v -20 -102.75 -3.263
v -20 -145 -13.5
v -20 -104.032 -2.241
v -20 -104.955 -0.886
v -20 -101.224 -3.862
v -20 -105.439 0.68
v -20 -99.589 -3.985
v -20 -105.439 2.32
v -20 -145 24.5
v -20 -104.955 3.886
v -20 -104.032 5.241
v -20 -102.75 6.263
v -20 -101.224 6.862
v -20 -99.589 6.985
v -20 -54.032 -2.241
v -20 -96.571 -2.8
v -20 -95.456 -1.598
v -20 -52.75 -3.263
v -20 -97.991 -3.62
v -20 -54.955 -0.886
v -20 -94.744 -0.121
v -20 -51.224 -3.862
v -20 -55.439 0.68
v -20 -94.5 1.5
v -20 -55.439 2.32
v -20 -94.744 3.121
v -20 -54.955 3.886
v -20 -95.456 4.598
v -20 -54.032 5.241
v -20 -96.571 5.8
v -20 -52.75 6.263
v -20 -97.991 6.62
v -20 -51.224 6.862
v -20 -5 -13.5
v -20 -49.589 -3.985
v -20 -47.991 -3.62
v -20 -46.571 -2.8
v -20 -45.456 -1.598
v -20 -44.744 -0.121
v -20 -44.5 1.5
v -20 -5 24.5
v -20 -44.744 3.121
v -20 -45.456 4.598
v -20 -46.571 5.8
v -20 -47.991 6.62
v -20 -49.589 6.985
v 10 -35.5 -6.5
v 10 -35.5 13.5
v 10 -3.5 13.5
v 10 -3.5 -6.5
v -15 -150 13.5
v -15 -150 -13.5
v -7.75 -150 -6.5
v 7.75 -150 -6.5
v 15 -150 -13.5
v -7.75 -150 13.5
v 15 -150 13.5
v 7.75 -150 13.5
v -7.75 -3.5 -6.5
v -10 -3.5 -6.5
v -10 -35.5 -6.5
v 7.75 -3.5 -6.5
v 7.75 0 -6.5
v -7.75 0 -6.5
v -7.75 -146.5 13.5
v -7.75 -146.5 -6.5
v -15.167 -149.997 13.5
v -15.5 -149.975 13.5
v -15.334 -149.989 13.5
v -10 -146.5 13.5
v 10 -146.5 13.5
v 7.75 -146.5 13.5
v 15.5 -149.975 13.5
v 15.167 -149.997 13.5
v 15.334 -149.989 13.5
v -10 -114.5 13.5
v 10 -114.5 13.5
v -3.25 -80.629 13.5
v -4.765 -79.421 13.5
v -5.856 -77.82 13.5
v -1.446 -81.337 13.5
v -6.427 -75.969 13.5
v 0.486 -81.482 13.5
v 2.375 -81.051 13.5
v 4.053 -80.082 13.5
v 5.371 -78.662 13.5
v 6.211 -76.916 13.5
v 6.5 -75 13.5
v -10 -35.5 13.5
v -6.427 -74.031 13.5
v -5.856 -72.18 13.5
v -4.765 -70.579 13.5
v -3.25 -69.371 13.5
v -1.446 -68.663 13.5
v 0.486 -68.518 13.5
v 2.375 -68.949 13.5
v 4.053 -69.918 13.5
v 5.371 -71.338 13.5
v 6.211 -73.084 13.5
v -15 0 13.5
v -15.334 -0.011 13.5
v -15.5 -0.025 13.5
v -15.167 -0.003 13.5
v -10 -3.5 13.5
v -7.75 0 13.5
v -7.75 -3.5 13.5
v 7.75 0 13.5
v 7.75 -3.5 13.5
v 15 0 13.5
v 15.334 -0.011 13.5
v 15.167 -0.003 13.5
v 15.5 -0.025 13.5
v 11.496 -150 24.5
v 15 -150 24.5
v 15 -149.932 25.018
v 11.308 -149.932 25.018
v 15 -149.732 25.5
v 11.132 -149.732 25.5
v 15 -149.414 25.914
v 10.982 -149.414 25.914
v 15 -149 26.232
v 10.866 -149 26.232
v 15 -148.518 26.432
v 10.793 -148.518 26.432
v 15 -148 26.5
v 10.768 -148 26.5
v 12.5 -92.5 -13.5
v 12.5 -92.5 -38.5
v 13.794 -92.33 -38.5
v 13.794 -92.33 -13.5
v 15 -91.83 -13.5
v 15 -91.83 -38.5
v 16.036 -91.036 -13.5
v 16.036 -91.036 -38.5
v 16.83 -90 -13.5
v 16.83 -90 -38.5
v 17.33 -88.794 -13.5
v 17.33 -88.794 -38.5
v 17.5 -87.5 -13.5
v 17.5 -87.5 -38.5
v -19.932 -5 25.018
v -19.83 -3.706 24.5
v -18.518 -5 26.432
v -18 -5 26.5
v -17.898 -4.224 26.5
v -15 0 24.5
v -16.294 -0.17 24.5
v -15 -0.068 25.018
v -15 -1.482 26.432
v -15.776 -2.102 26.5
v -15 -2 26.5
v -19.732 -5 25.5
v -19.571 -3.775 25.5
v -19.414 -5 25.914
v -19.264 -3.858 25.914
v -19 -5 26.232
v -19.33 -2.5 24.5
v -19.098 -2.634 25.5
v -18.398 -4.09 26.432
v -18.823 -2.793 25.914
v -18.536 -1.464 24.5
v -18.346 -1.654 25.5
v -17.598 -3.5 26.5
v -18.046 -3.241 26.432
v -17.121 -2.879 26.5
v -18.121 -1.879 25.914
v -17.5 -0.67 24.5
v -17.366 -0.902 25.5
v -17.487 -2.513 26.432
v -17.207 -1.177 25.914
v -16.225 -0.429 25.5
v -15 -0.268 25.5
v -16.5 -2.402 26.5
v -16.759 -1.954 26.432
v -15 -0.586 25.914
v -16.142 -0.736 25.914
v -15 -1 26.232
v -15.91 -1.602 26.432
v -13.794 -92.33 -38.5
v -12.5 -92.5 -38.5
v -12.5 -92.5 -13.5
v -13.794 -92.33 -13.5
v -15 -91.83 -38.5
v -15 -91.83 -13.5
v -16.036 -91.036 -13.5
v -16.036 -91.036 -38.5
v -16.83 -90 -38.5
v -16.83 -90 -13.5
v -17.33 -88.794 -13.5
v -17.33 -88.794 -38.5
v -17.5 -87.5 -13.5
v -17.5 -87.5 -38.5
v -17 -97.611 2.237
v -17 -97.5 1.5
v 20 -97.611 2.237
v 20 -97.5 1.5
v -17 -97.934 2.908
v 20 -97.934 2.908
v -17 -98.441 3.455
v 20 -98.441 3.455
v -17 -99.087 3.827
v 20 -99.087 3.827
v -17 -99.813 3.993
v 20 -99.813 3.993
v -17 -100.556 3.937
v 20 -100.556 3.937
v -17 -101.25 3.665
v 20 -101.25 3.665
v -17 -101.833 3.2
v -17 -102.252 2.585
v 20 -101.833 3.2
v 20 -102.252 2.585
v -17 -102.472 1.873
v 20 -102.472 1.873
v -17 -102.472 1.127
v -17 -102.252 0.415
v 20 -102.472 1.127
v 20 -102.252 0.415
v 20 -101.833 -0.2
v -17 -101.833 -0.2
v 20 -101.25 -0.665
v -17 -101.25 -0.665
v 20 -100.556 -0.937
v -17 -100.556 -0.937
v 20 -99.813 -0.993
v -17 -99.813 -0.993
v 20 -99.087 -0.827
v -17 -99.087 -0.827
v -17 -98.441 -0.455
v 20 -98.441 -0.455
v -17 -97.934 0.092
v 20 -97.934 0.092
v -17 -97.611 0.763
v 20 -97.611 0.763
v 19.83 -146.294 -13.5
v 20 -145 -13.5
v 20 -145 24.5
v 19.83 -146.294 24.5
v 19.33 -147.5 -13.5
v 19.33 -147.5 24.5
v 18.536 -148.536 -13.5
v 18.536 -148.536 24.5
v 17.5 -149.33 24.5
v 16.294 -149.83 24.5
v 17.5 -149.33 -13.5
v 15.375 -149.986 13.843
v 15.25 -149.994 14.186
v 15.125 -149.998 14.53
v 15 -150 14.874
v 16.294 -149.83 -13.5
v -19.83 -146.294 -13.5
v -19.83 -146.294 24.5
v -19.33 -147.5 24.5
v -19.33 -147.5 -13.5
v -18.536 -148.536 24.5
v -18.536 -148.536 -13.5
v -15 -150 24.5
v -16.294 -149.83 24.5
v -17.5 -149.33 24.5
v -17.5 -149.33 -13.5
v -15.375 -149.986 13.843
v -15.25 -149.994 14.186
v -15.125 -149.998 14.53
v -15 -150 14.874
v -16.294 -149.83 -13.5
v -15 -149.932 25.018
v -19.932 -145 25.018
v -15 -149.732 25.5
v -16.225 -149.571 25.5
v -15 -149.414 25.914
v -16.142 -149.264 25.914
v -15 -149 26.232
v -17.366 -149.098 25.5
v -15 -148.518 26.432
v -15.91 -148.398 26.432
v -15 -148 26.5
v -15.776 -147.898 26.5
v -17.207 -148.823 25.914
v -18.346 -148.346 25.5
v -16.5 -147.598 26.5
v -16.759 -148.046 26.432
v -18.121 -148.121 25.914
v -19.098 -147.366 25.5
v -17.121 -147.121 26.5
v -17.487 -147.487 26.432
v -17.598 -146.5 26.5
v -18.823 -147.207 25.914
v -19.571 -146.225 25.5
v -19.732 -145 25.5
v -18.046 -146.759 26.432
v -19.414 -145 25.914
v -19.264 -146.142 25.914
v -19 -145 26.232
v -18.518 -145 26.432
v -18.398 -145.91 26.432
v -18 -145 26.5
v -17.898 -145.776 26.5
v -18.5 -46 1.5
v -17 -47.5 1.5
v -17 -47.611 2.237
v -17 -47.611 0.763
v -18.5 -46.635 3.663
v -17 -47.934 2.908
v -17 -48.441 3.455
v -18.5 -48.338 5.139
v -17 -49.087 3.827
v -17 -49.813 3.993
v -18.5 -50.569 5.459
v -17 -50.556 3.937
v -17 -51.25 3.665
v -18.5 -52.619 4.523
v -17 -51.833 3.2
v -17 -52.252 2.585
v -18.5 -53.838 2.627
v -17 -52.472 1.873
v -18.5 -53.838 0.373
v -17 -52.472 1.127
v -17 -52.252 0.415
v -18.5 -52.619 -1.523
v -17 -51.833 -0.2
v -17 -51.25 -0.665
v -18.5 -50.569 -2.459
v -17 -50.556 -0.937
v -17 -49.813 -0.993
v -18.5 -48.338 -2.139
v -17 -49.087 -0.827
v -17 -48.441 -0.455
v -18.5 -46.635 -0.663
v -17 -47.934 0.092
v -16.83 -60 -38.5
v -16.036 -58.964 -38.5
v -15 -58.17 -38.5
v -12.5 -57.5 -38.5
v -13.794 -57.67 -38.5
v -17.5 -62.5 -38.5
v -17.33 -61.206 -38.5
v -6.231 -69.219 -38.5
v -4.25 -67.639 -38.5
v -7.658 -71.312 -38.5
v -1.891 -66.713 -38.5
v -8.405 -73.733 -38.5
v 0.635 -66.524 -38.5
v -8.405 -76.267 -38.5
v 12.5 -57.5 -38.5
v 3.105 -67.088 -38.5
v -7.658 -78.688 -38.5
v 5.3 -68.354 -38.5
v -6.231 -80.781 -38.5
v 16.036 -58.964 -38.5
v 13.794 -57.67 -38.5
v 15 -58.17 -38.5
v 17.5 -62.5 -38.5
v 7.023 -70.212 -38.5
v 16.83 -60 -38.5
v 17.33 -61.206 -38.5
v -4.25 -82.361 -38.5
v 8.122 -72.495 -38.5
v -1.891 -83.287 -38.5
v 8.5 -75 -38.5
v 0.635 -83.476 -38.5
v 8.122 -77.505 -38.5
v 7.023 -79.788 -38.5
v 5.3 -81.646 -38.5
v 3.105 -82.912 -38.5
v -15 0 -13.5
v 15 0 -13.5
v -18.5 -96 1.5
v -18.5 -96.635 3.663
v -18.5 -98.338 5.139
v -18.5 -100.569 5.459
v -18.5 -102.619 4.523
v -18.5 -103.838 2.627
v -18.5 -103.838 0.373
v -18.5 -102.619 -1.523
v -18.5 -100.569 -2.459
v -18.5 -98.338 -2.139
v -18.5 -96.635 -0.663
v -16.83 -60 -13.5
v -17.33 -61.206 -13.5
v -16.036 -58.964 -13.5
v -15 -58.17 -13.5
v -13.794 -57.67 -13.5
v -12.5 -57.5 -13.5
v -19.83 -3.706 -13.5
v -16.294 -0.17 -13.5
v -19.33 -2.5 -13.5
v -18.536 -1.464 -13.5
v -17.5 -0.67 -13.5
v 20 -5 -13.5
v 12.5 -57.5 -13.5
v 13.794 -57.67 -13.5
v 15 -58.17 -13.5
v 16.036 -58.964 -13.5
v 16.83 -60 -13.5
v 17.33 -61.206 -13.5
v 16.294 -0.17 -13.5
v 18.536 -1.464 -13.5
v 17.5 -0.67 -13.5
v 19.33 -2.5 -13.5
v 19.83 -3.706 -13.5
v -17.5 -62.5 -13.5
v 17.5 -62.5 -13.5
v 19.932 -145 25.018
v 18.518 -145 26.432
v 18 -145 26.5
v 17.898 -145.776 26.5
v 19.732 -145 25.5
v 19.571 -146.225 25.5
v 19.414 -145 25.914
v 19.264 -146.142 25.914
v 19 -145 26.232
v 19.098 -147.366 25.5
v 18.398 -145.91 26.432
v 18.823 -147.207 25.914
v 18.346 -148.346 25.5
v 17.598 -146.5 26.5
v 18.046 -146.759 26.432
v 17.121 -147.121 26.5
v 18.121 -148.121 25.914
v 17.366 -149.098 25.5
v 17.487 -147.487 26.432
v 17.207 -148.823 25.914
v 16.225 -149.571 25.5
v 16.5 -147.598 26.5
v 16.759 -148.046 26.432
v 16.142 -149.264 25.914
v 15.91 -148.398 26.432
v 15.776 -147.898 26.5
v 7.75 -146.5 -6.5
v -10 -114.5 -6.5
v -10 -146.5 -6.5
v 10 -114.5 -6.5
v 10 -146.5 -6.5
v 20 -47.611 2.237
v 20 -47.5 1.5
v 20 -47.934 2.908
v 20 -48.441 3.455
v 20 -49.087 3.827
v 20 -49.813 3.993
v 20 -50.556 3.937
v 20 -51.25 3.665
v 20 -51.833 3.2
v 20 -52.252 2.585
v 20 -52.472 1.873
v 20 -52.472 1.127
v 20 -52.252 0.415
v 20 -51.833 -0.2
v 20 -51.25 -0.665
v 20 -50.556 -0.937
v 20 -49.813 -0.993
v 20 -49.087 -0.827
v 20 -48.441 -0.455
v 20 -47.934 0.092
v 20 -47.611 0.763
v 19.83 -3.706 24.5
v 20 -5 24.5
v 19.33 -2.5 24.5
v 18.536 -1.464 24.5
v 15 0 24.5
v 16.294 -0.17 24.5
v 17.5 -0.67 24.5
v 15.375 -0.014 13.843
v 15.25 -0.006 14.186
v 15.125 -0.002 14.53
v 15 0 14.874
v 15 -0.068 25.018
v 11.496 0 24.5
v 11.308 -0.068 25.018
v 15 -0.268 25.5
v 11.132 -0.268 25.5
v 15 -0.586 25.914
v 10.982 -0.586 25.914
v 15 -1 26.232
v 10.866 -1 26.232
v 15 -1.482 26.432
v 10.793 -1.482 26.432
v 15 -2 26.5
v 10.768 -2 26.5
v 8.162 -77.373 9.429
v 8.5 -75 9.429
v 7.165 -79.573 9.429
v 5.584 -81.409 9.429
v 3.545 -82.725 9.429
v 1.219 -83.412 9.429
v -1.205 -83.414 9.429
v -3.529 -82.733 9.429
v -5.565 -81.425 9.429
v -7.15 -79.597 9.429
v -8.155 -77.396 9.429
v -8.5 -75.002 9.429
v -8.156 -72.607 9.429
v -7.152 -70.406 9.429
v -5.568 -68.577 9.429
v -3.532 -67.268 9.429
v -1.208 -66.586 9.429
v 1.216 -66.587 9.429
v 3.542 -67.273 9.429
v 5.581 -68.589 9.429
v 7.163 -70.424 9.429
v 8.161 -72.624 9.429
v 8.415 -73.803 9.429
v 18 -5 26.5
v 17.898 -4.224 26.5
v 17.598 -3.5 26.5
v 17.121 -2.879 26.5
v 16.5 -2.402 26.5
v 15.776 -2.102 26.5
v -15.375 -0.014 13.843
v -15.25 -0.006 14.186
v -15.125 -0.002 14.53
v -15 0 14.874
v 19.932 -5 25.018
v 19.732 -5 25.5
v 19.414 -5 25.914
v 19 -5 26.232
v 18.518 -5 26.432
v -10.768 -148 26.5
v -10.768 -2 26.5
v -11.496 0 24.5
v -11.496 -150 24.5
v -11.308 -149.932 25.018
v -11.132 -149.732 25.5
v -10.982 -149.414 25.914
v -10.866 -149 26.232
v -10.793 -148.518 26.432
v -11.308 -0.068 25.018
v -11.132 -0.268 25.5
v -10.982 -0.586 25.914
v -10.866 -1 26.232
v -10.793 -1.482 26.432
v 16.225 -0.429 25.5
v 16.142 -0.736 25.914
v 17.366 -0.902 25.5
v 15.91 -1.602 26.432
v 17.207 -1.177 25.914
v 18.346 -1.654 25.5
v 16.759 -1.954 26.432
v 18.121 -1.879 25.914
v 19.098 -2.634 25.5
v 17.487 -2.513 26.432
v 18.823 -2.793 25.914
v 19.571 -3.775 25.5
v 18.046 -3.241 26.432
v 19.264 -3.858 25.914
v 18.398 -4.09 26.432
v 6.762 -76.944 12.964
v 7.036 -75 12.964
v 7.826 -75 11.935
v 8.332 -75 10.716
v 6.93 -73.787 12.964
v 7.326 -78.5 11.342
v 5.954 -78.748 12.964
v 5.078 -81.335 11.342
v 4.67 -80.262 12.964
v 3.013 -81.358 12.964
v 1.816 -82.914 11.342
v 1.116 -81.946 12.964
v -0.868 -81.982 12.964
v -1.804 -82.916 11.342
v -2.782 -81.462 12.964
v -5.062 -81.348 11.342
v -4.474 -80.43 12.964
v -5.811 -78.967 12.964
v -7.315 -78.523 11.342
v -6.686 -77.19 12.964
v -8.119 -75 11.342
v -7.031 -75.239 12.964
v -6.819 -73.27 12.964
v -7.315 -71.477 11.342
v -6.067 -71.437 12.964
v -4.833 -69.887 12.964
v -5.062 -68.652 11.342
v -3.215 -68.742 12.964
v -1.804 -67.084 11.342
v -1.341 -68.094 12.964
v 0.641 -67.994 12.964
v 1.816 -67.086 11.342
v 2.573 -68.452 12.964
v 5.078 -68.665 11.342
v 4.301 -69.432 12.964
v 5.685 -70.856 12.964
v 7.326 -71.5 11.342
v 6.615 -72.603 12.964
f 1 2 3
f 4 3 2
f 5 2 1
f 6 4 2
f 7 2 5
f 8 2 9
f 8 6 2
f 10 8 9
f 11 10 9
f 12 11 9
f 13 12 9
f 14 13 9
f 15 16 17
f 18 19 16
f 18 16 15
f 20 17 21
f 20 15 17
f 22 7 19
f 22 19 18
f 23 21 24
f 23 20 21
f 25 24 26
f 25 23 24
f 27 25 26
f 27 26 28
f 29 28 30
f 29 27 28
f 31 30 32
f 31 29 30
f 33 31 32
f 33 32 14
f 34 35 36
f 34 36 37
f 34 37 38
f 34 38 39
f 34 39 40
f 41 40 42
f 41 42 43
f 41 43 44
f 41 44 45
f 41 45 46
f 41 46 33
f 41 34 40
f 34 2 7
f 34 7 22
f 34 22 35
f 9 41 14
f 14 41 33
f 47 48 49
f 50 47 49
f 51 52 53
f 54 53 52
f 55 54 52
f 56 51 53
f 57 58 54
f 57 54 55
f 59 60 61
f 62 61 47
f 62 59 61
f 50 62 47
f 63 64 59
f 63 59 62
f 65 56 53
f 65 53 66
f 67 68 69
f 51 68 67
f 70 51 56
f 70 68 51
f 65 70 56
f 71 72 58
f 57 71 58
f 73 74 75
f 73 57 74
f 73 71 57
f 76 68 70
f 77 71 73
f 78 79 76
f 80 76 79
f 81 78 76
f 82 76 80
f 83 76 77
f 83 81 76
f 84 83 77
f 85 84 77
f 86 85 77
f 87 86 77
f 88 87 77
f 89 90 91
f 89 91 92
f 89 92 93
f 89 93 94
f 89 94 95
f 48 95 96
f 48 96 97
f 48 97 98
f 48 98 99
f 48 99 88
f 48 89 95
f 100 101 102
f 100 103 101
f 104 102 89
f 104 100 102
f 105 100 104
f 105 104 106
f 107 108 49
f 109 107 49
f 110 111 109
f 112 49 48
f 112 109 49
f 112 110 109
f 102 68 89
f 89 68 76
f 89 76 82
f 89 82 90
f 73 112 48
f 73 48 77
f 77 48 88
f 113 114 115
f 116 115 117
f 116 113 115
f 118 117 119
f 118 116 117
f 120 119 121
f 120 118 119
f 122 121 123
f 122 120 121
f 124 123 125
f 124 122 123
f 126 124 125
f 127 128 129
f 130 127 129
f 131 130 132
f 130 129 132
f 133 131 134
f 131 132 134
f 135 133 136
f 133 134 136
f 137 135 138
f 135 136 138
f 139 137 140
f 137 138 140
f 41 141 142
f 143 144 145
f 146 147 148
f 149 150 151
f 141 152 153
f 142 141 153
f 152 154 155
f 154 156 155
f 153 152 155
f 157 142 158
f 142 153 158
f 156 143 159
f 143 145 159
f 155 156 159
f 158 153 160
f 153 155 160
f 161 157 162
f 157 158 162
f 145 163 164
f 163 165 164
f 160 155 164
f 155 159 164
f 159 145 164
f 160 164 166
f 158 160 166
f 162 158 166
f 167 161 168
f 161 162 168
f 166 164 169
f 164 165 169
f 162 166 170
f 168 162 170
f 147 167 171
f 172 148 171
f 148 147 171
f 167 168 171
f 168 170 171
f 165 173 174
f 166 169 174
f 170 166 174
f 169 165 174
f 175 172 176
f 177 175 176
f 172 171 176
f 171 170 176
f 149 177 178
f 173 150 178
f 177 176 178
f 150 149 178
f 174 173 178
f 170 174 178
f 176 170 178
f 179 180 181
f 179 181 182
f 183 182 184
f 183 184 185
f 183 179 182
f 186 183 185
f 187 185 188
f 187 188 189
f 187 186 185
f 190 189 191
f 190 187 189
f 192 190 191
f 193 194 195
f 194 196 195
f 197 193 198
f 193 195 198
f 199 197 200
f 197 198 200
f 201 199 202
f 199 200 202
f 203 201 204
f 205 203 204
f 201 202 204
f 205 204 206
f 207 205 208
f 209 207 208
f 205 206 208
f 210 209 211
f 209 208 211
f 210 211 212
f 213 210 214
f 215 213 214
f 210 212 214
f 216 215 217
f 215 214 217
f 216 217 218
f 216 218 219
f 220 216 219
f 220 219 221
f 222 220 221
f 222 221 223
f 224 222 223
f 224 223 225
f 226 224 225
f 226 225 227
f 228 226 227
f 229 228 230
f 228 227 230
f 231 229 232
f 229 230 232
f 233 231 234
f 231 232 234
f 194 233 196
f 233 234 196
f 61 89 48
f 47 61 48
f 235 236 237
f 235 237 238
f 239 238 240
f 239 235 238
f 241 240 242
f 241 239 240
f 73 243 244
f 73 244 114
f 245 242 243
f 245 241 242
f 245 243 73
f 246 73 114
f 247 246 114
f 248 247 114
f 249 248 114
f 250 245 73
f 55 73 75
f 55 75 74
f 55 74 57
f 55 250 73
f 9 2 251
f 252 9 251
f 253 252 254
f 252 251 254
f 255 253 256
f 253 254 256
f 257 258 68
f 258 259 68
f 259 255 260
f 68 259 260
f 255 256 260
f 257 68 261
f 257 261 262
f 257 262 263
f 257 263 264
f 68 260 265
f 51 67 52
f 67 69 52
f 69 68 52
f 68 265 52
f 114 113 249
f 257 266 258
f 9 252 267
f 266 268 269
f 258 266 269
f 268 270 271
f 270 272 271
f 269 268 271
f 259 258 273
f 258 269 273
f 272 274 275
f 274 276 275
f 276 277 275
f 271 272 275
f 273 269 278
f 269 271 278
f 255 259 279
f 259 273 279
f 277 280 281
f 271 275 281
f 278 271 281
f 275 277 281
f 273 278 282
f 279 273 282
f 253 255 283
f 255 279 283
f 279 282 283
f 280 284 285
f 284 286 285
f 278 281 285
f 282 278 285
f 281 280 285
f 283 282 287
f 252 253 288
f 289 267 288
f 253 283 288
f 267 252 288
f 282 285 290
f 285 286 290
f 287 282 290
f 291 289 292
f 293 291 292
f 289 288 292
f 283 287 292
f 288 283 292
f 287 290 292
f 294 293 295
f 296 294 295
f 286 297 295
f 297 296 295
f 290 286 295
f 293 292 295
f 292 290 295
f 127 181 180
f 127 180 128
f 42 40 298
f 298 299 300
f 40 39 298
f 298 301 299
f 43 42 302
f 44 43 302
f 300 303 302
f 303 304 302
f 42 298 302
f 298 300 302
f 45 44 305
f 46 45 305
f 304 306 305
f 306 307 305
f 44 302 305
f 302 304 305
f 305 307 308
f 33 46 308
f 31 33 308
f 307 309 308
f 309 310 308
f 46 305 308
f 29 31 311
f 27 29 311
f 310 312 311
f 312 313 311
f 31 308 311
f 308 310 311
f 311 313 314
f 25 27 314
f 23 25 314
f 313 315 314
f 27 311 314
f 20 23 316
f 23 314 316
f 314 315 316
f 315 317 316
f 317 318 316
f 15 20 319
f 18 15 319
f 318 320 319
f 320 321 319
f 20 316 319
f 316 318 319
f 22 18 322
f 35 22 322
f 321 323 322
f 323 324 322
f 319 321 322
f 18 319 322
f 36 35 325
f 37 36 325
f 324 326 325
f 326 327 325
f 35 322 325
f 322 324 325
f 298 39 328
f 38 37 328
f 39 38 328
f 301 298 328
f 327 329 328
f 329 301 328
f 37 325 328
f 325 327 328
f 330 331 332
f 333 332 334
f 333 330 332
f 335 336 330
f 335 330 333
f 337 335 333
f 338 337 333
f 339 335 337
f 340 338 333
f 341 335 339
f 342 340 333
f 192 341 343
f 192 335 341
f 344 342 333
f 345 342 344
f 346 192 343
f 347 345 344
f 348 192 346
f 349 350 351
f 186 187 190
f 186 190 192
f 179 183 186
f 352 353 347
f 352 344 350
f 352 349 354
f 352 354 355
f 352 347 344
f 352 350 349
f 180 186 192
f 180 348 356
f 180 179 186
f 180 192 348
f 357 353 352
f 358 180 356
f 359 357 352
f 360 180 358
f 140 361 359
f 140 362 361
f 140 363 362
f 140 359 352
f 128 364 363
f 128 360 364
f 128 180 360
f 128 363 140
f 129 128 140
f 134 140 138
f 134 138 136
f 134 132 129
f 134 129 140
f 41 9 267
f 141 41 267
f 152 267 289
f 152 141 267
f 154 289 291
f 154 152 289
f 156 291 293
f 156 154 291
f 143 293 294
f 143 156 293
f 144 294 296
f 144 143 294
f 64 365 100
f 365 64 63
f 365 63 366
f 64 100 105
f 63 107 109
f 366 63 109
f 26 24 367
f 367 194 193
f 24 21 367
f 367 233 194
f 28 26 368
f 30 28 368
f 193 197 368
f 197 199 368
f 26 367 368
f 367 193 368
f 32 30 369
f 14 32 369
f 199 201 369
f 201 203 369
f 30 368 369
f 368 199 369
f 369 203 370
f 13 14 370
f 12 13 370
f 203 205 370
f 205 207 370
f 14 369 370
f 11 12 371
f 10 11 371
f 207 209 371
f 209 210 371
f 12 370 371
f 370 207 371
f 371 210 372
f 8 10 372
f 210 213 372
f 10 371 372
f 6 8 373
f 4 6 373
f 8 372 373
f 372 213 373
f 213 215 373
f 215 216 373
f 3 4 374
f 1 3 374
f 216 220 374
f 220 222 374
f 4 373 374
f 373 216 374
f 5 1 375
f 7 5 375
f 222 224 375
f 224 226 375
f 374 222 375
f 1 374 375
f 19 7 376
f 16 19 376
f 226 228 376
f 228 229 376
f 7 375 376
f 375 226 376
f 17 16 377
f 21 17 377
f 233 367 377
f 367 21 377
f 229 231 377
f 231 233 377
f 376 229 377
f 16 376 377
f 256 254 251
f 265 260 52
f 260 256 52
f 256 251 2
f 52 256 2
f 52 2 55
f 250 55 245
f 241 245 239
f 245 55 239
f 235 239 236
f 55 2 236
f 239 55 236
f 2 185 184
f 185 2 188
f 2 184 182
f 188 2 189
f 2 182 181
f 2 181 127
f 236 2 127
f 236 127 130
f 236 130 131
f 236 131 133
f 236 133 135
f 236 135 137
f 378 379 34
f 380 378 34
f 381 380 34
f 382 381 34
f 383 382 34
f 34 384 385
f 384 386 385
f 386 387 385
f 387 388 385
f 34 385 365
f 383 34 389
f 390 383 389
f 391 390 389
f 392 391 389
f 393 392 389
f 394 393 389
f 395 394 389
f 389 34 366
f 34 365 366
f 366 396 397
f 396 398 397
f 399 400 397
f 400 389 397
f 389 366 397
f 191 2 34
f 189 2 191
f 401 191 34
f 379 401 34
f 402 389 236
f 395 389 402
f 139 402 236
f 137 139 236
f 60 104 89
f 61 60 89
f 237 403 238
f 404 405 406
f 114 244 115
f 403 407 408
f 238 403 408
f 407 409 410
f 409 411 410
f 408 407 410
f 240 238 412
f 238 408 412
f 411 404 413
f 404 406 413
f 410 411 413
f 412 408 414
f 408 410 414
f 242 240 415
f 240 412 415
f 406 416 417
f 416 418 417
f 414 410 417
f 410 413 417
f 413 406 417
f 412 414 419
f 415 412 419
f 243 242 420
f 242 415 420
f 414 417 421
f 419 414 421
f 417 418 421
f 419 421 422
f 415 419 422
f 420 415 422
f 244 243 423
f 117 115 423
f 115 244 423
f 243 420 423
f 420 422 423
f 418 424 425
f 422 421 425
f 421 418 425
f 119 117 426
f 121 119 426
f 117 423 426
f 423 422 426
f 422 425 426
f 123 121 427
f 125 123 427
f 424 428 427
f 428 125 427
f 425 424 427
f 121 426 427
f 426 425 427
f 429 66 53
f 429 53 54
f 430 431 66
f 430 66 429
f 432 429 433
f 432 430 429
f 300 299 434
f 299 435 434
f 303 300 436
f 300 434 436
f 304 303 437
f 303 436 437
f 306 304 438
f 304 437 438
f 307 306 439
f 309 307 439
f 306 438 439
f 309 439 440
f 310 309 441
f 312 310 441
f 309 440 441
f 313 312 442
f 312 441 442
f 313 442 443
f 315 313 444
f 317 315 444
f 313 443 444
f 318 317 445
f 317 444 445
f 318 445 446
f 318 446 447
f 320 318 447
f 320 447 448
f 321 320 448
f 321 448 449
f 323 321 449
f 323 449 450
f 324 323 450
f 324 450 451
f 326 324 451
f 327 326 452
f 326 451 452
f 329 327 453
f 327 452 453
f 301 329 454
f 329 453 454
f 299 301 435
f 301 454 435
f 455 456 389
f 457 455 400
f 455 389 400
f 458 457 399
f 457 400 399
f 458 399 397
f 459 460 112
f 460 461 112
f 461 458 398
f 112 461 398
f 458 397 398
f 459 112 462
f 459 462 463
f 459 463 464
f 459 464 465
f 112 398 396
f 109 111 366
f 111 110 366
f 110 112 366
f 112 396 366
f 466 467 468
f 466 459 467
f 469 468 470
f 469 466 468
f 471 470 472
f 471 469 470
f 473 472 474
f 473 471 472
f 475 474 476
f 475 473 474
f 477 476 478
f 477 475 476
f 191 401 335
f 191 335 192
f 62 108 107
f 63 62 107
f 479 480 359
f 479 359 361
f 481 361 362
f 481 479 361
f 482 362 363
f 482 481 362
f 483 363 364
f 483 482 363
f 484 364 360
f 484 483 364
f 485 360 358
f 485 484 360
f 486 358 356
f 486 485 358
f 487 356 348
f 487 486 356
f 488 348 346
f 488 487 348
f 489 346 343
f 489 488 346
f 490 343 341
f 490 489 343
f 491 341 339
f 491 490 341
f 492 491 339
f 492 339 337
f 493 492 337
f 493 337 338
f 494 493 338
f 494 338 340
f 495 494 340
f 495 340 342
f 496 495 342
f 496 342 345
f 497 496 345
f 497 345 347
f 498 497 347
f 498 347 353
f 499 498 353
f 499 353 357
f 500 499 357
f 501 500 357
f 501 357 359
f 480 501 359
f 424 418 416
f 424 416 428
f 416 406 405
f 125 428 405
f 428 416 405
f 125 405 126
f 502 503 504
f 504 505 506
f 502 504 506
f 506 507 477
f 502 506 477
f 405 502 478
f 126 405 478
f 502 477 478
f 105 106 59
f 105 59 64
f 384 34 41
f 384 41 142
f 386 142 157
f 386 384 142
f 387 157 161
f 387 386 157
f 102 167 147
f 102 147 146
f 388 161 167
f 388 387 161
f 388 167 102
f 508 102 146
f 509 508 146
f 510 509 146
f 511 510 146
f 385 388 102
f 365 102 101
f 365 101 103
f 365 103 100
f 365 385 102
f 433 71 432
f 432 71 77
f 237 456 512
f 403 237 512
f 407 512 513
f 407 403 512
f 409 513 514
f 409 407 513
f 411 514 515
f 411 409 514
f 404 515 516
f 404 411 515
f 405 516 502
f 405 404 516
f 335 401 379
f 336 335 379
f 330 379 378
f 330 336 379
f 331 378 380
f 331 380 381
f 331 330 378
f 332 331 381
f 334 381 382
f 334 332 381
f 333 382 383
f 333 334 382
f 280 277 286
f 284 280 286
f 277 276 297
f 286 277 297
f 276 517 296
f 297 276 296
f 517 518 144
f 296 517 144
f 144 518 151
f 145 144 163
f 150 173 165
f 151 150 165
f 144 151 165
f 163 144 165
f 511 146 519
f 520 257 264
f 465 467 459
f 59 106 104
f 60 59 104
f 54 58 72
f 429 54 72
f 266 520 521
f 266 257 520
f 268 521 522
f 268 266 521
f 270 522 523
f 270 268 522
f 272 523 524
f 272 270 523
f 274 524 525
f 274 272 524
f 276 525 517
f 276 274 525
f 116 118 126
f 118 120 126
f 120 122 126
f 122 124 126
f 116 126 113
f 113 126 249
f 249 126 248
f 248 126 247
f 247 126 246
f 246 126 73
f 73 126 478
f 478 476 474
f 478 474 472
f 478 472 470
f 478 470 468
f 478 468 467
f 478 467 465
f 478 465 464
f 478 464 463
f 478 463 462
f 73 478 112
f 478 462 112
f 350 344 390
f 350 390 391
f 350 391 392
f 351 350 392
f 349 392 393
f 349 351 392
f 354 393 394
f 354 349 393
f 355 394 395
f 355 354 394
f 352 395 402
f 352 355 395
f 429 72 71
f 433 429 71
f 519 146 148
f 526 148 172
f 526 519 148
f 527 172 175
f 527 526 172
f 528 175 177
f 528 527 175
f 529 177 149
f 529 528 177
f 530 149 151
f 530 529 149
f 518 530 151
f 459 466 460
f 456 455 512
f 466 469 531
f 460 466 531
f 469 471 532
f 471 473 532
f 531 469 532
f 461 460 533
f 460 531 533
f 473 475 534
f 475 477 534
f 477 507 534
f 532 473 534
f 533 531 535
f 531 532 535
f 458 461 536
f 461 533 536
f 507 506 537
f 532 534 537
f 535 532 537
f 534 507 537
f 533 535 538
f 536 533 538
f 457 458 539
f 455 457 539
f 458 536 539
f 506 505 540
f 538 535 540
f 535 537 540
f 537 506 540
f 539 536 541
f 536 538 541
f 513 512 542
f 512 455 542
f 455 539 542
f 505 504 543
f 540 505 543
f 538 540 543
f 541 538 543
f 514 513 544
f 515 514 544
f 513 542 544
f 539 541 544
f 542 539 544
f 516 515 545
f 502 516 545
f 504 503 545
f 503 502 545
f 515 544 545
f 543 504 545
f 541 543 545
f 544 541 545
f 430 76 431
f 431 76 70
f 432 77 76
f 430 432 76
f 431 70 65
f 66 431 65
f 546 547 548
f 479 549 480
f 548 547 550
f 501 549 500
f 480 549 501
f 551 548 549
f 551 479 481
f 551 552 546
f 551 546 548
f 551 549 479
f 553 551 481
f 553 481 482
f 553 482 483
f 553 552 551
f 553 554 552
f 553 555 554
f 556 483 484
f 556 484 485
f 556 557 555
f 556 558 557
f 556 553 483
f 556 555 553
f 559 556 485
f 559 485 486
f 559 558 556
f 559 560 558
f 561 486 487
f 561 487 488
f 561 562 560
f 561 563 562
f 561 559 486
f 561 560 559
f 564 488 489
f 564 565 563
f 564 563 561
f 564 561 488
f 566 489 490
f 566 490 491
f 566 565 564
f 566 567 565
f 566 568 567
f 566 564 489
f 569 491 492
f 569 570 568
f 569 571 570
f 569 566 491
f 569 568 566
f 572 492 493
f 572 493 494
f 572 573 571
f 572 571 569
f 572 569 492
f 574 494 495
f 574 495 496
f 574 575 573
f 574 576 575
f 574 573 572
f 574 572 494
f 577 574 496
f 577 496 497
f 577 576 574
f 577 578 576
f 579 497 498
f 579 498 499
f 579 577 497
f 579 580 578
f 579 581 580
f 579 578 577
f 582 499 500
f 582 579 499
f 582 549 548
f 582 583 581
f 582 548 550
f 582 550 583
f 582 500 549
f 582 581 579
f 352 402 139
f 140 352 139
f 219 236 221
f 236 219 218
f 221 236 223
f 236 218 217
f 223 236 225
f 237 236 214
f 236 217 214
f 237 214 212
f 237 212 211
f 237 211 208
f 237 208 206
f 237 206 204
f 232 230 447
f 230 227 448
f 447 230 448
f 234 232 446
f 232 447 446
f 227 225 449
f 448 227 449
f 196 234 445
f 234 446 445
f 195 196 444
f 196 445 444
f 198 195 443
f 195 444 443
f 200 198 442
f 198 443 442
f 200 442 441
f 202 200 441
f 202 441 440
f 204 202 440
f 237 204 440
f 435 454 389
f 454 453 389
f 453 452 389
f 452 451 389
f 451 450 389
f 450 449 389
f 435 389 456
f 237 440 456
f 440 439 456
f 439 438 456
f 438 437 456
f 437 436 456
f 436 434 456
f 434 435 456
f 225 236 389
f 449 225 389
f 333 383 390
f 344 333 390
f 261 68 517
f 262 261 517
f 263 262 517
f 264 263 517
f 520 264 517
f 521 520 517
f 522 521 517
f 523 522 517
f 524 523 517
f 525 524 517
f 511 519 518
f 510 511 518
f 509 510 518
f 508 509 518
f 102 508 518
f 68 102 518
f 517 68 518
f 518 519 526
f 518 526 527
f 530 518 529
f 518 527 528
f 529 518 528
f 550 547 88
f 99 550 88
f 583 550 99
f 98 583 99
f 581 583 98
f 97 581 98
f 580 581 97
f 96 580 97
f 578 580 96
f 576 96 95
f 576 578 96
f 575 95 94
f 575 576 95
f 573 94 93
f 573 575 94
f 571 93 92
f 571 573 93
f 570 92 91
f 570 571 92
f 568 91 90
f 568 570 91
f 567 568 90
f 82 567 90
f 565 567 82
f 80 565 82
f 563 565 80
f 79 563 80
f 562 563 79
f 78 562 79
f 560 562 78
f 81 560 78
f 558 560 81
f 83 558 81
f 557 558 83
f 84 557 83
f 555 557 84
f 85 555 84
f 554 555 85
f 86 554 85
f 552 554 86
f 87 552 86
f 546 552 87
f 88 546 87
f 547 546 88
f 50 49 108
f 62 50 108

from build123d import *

# Parameters (mm, degrees)
F0_W           = 40
F0_H           = 27
F1_DEPTH       = 150
F2_W           = 15.5
F2_H           = 3.5
F3_DEPTH       = 20
F5_W           = 35
F5_H           = 35
F5_R           = 8.5
F6_DEPTH       = 25
F4_R           = 8.5
F7_DEPTH       = 25
F8_R           = 5.5
F9_DEPTH       = 52.001
F10_S5_R       = 8.5
F10_T6_DEPTH   = 14
F11_R          = 5
F13_DEPTH      = 150
F14_T1_DEPTH   = 65
F14_T3_DEPTH   = 37.5
F15_R          = 2
F16_R          = 2.5
F17_DEPTH      = 20.001
F17_DEPTH_BACK = 25
F18_SIZE       = 3


# Not quite as in the source:
# - a fillet or chamfer that OpenCascade refuses, or shapes differently, is made with other operations: its cross-section is extruded or revolved along the edge and cut away or added


with BuildPart() as f1:
    # F0 (on Front) → F1 (new body)
    with BuildSketch(Plane.XZ):
        Rectangle(F0_W, F0_H)
    extrude(amount=F1_DEPTH)

    # F2 (on face) → F3 (cut)
    with BuildSketch(Plane.XY.offset(13.5)):
        with Locations((0, -1.75)):
            Rectangle(F2_W, F2_H)
        Polygon((-7.75, -3.5), (-10, -3.5), (-10, -35.5), (10, -35.5), (10, -3.5), (7.75, -3.5), align=None)
        Polygon((-10, -146.5), (-7.75, -146.5), (7.75, -146.5), (10, -146.5), (10, -114.5), (-10, -114.5), align=None)
        with Locations((0, -148.25)):
            Rectangle(F2_W, F2_H)
    extrude(amount=-F3_DEPTH, mode=Mode.SUBTRACT)

    # F5 (on face) → F6 (join)
    with BuildSketch(Plane(origin=(0, 0, -13.5), x_dir=(1, 0, 0), z_dir=(0, 0, -1))):
        with Locations((0, 75)):
            Rectangle(F5_W, F5_H)
        with Locations((0, 75)):
            Circle(F5_R, mode=Mode.SUBTRACT)
    extrude(amount=F6_DEPTH)

    # F4 (on face) → F7 (cut)
    with BuildSketch(Plane(origin=(0, 0, -13.5), x_dir=(1, 0, 0), z_dir=(0, 0, -1))):
        with Locations((0, 75)):
            Circle(F4_R)
    extrude(amount=-F7_DEPTH, mode=Mode.SUBTRACT)

    # F8 (on face) → F9 (cut, through all)
    with BuildSketch(Plane.XY.offset(13.5)):
        with Locations((0, -75)):
            Circle(F8_R)
    extrude(amount=-F9_DEPTH, mode=Mode.SUBTRACT)

    # F10: chamfer of 3 on 1 edges, made by hand


with BuildPart() as f10_tool2:
    # F10_s3 → F10_t4 (revolve)
    with BuildSketch(Plane.XZ.offset(75)):
        Polygon((5.5, 14.5), (8.5, 11.5), (5.5, 11.5), align=None)
    revolve(axis=Axis((0, -75, 11.5), (0, 0, 1)))

    # F10_s5 → F10_t6 (intersect, symmetric)
    with BuildSketch(Plane.XY.offset(13)):
        with Locations((0, -75)):
            Circle(F10_S5_R)
    extrude(amount=F10_T6_DEPTH, both=True, mode=Mode.INTERSECT)


with BuildPart() as f1_1:
    add(f1.part)

    # F10_t1: cut F10_tool2
    add(f10_tool2.part, mode=Mode.SUBTRACT)

    # F11
    f11_edges = [f1_1.edges().sort_by_distance(p)[0] for p in [
        (-8.5, -75, 11.5),
    ]]
    fillet(f11_edges, radius=F11_R)

    # F12 (on Front) → F13 (join, through all)
    with BuildSketch(Plane.XZ):
        Polygon((10.7683869545, 26.5), (15.5, 13.5), (20, 13.5), (20, 26.5), align=None)
        Polygon((-20, 26.5), (-20, 13.5), (-15.5, 13.5), (-10.7683869545, 26.5), align=None)
    extrude(amount=F13_DEPTH)

    # F14: fillet of radius 5 on 8 edges, made by hand

    # F14_s2 → F14_t1 (cut)
    with BuildSketch(Plane.XY.offset(-26)):
        with BuildLine():
            ThreePointArc((-20, -145), (-18.5355339059, -148.5355339059), (-15, -150))
            Line((-15, -150), (-20, -150))
            Line((-20, -150), (-20, -145))
        make_face()
        with BuildLine():
            ThreePointArc((20, -145), (18.5355339059, -148.5355339059), (15, -150))
            Line((15, -150), (20, -150))
            Line((20, -150), (20, -145))
        make_face()
        with BuildLine():
            ThreePointArc((20, -5), (18.5355339059, -1.4644660941), (15, 0))
            Line((15, 0), (20, 0))
            Line((20, 0), (20, -5))
        make_face()
        with BuildLine():
            ThreePointArc((-20, -5), (-18.5355339059, -1.4644660941), (-15, 0))
            Line((-15, 0), (-20, 0))
            Line((-20, 0), (-20, -5))
        make_face()
    extrude(amount=F14_T1_DEPTH, mode=Mode.SUBTRACT)

    # F14_s4 → F14_t3 (cut)
    with BuildSketch(Plane.XY.offset(-51)):
        with BuildLine():
            ThreePointArc((12.5, -57.5), (16.0355339059, -58.9644660941), (17.5, -62.5))
            Line((17.5, -62.5), (17.5, -57.5))
            Line((17.5, -57.5), (12.5, -57.5))
        make_face()
        with BuildLine():
            ThreePointArc((12.5, -92.5), (16.0355339059, -91.0355339059), (17.5, -87.5))
            Line((17.5, -87.5), (17.5, -92.5))
            Line((17.5, -92.5), (12.5, -92.5))
        make_face()
        with BuildLine():
            ThreePointArc((-17.5, -62.5), (-16.0355339059, -58.9644660941), (-12.5, -57.5))
            Line((-12.5, -57.5), (-17.5, -57.5))
            Line((-17.5, -57.5), (-17.5, -62.5))
        make_face()
        with BuildLine():
            ThreePointArc((-12.5, -92.5), (-16.0355339059, -91.0355339059), (-17.5, -87.5))
            Line((-17.5, -87.5), (-17.5, -92.5))
            Line((-17.5, -92.5), (-12.5, -92.5))
        make_face()
    extrude(amount=F14_T3_DEPTH, mode=Mode.SUBTRACT)

    # F15
    f15_edges = [f1_1.edges().sort_by_distance(p)[0] for p in [
        (-12.884193, -150, 26.5),
        (12.884193, -150, 26.5),
    ]]
    fillet(f15_edges, radius=F15_R)

    # F16 (on Right) → F17 (cut, two sides)
    with BuildSketch(Plane.YZ) as f17_sk:
        with Locations((-100, 1.5)):
            Circle(F16_R)
        with Locations((-50, 1.5)):
            Circle(F16_R)
    extrude(amount=-F17_DEPTH, mode=Mode.SUBTRACT)
    extrude(f17_sk.sketch, amount=F17_DEPTH_BACK, mode=Mode.SUBTRACT)

    # F18
    f18_edges = [f1_1.edges().sort_by_distance(p)[0] for p in [
        (-20, -52.5, 1.5),
        (-20, -102.5, 1.5),
    ]]
    chamfer(f18_edges, length=F18_SIZE)


solid = f1_1.part
